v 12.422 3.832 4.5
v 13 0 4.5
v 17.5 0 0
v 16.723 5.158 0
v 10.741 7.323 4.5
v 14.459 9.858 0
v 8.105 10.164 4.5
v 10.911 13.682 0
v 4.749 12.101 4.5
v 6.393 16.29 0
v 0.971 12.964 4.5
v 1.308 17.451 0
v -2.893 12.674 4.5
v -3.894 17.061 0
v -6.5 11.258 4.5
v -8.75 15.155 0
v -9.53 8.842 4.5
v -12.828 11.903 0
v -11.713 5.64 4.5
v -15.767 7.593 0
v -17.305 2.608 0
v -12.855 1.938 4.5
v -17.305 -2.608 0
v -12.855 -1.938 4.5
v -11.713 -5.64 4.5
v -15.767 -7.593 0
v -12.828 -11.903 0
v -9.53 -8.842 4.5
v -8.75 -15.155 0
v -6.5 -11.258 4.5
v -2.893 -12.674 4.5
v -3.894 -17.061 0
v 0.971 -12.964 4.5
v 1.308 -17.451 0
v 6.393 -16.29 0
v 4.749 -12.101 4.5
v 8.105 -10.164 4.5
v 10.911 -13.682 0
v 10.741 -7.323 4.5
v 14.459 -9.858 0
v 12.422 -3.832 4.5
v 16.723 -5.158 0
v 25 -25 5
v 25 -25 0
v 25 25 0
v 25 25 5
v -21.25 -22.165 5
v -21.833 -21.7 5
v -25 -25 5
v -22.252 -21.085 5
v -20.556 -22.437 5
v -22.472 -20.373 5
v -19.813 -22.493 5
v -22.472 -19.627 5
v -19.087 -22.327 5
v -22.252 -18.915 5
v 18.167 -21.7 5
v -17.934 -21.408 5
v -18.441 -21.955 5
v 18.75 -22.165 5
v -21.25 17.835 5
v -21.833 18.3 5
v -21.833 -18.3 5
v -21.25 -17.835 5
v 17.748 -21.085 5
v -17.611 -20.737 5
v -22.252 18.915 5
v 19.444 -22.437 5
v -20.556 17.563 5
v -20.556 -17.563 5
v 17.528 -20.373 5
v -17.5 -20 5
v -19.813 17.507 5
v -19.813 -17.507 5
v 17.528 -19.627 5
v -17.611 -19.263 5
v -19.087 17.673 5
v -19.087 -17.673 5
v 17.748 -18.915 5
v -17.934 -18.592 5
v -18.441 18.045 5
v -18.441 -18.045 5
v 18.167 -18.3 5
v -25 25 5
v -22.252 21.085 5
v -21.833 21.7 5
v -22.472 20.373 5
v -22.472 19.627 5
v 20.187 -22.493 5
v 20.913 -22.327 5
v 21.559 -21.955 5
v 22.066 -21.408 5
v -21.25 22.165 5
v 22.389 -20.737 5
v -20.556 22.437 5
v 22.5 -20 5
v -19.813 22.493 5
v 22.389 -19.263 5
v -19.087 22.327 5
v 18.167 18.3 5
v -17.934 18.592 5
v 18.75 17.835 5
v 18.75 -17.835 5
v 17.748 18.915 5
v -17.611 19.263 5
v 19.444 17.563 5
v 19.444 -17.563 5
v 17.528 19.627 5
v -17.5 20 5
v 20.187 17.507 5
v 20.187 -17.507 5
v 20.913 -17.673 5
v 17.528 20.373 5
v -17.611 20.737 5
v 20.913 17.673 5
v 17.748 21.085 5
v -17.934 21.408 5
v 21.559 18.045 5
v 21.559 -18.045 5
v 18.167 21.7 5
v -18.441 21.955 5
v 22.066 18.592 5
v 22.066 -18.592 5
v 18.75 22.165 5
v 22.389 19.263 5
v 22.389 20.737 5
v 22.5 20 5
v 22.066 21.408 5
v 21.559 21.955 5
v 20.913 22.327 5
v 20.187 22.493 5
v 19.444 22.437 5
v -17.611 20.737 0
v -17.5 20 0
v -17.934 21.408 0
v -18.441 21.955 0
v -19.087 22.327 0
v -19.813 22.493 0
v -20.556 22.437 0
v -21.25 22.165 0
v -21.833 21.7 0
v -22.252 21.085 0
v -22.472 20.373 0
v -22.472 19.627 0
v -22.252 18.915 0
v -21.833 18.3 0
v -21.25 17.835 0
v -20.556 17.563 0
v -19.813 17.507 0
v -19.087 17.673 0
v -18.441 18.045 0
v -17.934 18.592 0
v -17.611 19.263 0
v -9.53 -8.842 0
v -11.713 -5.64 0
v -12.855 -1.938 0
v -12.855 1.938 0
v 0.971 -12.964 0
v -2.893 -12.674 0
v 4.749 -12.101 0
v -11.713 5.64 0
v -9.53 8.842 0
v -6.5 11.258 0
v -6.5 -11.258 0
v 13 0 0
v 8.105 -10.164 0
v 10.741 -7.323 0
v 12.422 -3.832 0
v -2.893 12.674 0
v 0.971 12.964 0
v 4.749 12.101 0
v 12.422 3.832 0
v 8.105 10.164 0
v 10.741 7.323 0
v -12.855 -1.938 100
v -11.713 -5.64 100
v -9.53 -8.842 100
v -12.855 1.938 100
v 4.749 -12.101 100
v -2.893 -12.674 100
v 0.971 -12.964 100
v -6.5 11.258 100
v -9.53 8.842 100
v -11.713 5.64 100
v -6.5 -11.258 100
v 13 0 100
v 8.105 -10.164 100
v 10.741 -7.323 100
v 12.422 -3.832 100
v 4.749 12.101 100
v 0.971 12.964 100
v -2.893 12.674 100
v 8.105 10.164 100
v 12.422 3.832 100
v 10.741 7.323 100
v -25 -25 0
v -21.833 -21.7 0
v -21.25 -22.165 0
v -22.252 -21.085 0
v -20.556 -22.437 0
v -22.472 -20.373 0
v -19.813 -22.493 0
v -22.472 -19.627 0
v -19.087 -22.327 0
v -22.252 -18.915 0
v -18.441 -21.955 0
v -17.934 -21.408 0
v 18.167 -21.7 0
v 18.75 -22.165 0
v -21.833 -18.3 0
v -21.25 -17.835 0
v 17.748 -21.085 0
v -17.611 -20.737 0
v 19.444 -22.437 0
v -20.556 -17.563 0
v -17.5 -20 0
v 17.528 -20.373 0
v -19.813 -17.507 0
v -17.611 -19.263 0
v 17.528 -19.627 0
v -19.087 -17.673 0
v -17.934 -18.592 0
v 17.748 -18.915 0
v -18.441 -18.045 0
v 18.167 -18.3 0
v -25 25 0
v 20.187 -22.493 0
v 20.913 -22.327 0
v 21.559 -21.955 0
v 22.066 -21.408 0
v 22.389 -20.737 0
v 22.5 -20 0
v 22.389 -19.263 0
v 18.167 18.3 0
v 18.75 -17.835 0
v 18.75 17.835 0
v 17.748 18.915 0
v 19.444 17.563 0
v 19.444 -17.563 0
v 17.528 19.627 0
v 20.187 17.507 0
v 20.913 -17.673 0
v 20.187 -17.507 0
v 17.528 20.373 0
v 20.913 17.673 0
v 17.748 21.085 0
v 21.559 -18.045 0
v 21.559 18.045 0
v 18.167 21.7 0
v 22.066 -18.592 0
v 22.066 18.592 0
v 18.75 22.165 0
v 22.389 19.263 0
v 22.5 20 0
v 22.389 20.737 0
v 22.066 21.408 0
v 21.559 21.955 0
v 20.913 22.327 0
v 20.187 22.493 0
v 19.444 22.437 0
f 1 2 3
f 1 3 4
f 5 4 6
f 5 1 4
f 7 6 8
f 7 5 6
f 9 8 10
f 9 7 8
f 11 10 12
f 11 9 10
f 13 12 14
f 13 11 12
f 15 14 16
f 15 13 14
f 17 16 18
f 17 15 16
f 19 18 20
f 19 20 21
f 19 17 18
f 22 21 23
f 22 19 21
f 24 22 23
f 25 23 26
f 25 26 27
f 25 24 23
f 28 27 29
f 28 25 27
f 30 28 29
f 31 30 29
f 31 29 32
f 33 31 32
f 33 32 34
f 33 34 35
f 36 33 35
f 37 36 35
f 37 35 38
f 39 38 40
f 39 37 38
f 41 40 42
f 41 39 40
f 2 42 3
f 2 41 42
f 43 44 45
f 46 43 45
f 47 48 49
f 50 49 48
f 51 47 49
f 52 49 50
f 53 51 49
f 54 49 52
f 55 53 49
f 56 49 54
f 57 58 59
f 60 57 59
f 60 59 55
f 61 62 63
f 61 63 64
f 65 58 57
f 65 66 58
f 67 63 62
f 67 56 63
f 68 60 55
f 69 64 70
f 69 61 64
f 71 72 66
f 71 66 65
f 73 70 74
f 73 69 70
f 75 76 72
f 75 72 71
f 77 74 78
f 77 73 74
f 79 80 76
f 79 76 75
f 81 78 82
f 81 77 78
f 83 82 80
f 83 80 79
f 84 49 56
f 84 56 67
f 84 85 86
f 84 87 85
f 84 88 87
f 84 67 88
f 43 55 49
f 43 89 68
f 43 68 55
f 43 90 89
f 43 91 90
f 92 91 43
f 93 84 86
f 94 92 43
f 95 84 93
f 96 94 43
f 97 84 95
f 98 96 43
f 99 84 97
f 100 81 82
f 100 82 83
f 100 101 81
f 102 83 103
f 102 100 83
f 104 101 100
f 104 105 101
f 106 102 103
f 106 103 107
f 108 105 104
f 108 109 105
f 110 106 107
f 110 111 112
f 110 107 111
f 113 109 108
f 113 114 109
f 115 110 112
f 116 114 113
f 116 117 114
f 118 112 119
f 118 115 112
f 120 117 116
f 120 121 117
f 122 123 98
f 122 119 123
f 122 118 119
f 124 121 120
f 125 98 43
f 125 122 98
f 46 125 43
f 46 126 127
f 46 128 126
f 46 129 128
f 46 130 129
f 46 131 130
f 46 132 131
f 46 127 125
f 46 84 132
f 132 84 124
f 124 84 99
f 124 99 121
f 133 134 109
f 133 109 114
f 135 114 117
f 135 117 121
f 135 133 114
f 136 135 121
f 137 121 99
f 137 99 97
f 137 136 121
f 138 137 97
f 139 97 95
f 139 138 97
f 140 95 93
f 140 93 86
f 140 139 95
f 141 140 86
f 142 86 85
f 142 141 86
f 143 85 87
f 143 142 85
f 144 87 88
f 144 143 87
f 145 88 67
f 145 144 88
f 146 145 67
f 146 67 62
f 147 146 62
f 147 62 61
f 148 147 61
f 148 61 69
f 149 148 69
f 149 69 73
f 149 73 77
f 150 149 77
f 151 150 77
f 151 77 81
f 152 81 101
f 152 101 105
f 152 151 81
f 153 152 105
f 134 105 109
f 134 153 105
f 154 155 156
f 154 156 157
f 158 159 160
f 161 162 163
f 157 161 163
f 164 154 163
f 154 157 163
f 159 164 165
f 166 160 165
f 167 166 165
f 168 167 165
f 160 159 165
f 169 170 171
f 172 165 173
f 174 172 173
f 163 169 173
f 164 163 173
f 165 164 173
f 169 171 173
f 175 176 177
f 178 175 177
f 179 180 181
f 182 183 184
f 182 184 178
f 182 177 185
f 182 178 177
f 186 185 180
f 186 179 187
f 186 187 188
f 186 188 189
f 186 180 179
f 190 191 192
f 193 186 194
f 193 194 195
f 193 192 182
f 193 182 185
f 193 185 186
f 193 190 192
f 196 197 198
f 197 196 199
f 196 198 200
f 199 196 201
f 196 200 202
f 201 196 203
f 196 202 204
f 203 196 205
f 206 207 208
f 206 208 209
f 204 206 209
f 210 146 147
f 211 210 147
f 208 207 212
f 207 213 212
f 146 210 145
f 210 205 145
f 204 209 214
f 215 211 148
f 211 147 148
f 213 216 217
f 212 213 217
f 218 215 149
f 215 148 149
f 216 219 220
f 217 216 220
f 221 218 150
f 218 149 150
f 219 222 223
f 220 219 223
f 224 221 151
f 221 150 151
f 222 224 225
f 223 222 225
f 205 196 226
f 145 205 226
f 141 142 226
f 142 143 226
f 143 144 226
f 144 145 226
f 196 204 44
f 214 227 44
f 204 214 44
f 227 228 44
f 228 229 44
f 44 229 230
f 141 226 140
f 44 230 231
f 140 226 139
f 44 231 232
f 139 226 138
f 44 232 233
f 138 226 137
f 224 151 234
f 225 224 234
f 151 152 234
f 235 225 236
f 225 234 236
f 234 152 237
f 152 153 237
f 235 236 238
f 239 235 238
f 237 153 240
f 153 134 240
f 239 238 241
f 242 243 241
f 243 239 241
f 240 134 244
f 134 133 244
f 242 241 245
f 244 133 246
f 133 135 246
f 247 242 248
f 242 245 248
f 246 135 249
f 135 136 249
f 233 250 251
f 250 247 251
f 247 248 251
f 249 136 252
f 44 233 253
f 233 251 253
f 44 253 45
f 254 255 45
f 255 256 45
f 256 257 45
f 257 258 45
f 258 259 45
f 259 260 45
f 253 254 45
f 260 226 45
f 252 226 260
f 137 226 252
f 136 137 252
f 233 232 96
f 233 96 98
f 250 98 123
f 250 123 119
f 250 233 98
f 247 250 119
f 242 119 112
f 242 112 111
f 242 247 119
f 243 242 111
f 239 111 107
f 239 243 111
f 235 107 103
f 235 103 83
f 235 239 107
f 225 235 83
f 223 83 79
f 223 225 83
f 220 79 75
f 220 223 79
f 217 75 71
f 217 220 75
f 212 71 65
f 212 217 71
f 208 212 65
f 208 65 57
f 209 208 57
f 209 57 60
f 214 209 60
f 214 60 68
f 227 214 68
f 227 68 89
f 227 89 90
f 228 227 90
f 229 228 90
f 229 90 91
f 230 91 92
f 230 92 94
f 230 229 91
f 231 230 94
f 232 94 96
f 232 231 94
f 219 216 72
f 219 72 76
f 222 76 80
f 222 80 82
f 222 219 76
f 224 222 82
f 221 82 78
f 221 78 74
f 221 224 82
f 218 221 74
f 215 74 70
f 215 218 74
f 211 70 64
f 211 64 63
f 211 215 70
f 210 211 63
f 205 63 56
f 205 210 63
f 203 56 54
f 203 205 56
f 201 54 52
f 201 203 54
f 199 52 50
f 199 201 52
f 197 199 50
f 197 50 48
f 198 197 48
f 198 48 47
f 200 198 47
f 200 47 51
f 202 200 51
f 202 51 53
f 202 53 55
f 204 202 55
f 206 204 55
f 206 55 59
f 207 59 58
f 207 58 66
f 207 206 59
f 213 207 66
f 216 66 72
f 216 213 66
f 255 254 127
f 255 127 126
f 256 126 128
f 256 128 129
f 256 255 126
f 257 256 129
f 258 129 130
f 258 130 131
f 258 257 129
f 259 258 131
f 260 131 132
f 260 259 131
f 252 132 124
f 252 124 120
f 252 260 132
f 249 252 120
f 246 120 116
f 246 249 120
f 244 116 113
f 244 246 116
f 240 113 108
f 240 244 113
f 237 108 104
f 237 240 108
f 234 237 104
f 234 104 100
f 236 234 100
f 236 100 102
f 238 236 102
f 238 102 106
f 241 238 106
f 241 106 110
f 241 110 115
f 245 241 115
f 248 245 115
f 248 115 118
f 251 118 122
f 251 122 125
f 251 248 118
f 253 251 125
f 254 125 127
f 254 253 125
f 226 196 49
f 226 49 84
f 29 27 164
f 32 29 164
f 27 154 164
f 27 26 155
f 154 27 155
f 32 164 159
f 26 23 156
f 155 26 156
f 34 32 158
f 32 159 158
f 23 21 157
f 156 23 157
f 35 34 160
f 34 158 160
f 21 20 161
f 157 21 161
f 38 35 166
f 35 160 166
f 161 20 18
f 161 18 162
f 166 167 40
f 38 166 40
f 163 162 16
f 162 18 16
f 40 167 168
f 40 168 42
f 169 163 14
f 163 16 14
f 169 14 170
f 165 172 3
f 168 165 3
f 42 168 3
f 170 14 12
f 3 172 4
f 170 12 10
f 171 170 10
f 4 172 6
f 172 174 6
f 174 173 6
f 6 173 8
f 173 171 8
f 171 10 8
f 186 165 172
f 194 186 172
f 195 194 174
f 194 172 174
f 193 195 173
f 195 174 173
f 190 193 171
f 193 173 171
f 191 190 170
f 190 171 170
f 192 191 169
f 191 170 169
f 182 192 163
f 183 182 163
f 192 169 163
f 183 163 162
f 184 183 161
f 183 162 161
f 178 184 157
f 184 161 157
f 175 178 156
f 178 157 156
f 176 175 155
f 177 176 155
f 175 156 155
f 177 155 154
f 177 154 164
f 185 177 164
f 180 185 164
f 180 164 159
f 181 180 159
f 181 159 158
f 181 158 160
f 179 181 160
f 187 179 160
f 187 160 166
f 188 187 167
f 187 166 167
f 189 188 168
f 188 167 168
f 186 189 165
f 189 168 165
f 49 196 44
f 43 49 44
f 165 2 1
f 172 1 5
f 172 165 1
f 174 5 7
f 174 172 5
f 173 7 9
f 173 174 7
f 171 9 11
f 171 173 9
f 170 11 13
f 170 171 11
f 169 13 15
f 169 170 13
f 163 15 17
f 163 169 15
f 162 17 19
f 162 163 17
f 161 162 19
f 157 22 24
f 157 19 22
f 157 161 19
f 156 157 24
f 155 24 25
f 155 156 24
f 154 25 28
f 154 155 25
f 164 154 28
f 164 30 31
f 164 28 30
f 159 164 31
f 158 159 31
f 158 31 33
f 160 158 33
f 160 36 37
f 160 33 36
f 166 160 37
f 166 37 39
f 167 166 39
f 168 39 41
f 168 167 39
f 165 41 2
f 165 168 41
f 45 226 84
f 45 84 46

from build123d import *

# Parameters (mm, degrees)
F0_R     = 13
F1_DEPTH = 100
F2_W     = 50
F2_H     = 50
F2_R     = 2.5
F3_DEPTH = 5
F4_R     = 17.5
F4_R_2   = 13
F5_DEPTH = 5


# Not quite as in the source:
# - a fillet or chamfer that OpenCascade refuses, or shapes differently, is made with other operations: its cross-section is extruded or revolved along the edge and cut away or added


with BuildPart() as f1:
    # F0 (on Top) → F1 (new body)
    with BuildSketch(Plane.XY):
        Circle(F0_R)
    extrude(amount=F1_DEPTH)


with BuildPart() as f3:
    # F2 (on Top) → F3 (new body)
    with BuildSketch(Plane.XY):
        Rectangle(F2_W, F2_H)
        with Locations((-20, -20)):
            Circle(F2_R, mode=Mode.SUBTRACT)
        with Locations((20, -20)):
            Circle(F2_R, mode=Mode.SUBTRACT)
        with Locations((-20, 20)):
            Circle(F2_R, mode=Mode.SUBTRACT)
        with Locations((20, 20)):
            Circle(F2_R, mode=Mode.SUBTRACT)
    extrude(amount=F3_DEPTH)


with BuildPart() as f5:
    # F4 (on Top) → F5 (new body)
    with BuildSketch(Plane.XY):
        Circle(F4_R)
        Circle(F4_R_2, mode=Mode.SUBTRACT)
    extrude(amount=F5_DEPTH)

    # F6: chamfer of 5 on 1 edges, made by hand

    # F6_s1 → F6_t2 (revolve, cut)
    with BuildSketch(Plane.XZ):
        Polygon((17.5, 0), (12.5, 5), (17.5, 5), align=None)
    revolve(axis=Axis((0, 0, 5), (0, 0, 1)), mode=Mode.SUBTRACT)


solid = Compound([f1.part, f3.part, f5.part])
